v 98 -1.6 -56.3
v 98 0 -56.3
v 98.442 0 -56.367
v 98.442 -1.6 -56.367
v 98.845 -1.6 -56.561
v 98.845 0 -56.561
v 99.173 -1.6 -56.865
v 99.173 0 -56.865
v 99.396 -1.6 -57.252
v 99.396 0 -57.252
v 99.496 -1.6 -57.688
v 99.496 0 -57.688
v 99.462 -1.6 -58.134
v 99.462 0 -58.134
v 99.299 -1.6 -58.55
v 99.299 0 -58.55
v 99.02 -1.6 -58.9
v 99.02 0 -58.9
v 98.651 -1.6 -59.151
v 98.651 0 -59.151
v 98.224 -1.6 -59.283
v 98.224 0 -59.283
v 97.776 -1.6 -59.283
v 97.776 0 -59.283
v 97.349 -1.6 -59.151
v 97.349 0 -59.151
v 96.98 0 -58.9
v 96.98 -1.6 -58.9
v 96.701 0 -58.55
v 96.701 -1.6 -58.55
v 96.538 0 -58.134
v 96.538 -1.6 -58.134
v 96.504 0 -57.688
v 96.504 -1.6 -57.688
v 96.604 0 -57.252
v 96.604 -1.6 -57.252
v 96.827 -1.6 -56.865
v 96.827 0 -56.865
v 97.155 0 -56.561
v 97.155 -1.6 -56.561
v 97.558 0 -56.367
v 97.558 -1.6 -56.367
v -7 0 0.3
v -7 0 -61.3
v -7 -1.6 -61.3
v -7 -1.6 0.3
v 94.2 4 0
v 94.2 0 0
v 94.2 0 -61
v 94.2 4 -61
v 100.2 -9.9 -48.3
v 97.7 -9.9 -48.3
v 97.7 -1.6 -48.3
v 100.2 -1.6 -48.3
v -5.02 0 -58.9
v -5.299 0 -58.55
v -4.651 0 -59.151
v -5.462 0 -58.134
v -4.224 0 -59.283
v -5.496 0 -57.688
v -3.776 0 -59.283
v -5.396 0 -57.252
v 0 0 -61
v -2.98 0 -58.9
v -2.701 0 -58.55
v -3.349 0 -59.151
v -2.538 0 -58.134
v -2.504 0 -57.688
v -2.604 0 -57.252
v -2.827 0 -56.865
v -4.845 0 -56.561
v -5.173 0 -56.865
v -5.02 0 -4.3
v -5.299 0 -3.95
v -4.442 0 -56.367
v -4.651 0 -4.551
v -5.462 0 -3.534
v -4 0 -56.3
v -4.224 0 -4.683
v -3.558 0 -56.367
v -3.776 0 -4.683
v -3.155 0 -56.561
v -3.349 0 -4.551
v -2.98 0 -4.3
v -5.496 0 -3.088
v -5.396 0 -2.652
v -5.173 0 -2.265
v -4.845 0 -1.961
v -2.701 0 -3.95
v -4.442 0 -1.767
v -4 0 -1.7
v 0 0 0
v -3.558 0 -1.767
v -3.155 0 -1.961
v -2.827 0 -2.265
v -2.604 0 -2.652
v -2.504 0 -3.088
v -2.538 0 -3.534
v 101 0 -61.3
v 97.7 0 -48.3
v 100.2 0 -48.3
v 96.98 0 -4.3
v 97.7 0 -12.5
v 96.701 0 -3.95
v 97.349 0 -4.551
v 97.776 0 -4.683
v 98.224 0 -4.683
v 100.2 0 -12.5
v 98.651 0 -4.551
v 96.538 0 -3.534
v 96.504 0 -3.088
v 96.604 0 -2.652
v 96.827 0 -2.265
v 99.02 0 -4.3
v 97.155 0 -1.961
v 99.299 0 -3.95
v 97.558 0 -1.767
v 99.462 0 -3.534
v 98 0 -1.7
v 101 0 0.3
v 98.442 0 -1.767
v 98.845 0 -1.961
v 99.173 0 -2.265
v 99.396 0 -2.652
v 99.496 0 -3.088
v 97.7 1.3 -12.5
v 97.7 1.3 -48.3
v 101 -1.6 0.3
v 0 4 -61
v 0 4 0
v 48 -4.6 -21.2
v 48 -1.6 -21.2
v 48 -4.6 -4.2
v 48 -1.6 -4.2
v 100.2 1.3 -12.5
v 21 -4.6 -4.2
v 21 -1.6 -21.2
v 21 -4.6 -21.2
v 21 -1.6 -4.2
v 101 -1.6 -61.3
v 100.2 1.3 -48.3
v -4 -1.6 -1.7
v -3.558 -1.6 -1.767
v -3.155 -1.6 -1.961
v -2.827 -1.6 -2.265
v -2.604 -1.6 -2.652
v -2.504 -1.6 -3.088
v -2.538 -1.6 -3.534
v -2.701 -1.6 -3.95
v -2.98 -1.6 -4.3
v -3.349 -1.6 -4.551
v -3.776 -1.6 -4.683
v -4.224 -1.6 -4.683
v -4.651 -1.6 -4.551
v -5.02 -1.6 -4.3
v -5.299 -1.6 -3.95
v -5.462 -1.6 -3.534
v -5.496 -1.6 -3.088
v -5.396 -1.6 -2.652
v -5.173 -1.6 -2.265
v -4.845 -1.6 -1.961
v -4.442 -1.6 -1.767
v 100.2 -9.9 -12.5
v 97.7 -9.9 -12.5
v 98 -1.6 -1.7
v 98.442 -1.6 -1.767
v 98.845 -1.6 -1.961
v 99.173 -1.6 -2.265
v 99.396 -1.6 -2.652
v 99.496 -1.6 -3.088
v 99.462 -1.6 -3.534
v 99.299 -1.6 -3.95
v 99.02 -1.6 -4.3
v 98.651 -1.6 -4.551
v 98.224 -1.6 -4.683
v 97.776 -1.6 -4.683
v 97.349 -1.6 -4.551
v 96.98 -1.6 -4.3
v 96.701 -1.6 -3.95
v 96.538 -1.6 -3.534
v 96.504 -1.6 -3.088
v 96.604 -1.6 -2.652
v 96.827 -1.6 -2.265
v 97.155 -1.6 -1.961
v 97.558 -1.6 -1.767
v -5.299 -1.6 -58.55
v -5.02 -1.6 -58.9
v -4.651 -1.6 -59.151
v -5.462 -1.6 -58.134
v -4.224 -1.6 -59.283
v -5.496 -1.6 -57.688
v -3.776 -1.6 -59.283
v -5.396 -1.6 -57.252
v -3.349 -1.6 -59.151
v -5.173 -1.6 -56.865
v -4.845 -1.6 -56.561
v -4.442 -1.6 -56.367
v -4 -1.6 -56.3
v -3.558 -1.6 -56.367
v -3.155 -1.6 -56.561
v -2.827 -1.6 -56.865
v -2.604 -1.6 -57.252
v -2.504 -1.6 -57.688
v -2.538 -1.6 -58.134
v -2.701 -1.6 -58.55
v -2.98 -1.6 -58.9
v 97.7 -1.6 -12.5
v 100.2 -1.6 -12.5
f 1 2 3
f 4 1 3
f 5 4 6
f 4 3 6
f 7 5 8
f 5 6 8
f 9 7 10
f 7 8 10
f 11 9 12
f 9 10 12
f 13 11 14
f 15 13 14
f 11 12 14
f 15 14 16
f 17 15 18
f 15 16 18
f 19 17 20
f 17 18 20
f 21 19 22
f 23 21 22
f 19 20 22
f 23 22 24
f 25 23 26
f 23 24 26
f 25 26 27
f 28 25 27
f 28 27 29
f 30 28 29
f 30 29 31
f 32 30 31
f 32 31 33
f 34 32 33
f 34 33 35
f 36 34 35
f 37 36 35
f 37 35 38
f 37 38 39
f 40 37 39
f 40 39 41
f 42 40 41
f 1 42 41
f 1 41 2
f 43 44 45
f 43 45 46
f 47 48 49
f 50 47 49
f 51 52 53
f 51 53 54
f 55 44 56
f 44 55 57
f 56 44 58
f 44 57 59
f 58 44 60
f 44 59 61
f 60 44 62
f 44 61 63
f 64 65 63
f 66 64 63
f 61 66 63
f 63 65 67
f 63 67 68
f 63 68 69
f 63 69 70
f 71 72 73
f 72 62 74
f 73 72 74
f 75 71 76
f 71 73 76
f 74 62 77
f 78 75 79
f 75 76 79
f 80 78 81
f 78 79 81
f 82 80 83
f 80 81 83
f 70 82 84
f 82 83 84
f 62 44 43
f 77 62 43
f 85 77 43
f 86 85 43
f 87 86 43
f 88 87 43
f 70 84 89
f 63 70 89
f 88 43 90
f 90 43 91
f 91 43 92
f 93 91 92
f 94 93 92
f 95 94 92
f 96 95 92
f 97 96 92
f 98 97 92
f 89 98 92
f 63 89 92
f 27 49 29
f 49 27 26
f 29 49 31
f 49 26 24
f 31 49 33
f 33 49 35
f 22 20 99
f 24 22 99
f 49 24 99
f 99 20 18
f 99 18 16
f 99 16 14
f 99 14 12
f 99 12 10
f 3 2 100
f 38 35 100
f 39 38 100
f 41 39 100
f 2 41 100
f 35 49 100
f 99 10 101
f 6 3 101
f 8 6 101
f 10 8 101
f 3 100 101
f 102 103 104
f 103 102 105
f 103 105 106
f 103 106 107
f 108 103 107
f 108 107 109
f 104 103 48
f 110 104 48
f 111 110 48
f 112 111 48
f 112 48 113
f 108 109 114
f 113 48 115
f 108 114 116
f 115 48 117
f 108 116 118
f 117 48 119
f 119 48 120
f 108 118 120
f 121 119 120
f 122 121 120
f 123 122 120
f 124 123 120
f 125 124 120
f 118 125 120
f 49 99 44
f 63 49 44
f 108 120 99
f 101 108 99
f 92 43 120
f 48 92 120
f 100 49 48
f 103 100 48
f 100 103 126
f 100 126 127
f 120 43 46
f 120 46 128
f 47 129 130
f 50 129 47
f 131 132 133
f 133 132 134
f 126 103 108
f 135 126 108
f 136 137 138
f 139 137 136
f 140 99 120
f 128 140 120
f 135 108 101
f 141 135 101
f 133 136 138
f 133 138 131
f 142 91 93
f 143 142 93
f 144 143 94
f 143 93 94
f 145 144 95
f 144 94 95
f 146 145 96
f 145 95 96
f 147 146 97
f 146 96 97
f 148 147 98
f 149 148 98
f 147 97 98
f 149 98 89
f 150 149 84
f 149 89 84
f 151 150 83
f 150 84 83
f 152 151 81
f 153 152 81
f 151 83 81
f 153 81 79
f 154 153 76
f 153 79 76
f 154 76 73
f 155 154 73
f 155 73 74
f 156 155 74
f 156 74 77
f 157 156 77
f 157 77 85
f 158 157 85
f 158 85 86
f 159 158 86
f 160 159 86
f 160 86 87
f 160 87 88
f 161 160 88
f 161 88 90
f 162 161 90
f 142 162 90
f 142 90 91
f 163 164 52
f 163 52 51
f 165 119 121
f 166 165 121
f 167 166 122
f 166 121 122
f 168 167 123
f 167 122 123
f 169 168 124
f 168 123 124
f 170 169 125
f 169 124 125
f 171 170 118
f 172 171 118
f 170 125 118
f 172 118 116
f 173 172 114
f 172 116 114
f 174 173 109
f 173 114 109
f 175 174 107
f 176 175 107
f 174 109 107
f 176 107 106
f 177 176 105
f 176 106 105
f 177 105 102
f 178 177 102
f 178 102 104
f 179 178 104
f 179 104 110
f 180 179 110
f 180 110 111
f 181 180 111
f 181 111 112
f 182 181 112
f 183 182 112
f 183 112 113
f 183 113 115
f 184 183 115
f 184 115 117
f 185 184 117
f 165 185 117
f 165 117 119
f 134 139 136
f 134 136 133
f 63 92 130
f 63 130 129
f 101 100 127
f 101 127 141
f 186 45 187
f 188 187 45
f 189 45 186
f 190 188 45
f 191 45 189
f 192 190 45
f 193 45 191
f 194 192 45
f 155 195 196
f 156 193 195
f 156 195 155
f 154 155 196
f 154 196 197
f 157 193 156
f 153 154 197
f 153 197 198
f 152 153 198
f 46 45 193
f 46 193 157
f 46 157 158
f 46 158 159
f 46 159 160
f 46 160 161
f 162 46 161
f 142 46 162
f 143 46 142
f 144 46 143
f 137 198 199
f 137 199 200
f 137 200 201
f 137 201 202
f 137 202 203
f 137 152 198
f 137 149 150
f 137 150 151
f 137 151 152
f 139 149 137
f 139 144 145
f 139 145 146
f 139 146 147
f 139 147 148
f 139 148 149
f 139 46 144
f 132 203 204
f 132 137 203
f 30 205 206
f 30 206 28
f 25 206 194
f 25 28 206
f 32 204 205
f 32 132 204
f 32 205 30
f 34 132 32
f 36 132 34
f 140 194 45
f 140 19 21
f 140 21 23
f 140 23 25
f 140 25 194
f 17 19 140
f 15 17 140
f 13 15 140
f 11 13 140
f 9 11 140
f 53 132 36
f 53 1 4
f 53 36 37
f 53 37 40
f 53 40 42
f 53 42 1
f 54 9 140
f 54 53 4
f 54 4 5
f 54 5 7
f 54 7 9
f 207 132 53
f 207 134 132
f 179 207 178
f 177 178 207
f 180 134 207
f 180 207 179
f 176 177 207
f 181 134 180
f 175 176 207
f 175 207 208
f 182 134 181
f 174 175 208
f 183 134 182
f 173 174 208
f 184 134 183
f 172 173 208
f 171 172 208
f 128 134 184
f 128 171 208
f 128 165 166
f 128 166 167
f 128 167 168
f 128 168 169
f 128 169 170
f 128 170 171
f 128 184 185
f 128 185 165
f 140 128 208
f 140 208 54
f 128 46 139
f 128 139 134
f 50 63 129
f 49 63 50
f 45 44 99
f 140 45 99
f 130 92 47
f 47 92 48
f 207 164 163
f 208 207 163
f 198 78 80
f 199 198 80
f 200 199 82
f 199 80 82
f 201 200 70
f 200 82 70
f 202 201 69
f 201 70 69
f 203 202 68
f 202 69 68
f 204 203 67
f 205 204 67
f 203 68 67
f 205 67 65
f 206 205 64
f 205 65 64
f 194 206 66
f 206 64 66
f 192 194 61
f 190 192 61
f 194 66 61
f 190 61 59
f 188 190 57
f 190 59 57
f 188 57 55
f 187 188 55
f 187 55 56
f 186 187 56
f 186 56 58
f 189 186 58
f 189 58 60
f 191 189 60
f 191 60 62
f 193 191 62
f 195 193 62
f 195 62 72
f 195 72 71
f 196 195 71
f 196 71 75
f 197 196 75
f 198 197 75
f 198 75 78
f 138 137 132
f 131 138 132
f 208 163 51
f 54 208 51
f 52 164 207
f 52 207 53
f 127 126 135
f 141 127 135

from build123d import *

# Parameters (mm, degrees)
SCHIZZO1_W                        = 94.2
SCHIZZO1_H                        = 61
ESTRUSIONE_ESTRUSIONE1_DEPTH      = 4
SCHIZZO2_W                        = 108
SCHIZZO2_H                        = 61.6
ESTRUSIONE_ESTRUSIONE2_DEPTH      = 1.6
ESTRUSIONE_ESTRUSIONE3_DEPTH      = 1.3
ESTRUSIONE_ESTRUSIONE3_DEPTH_BACK = 9.9
SCHIZZO4_W                        = 2.5
SCHIZZO4_H                        = 35.8
SCHIZZO6_R                        = 1.5
TAGLIO_ESTRUSIONE1_DEPTH          = 2
SCHIZZO7_W                        = 27
SCHIZZO7_H                        = 17
ESTRUSIONE_ESTRUSIONE4_DEPTH      = 3


with BuildPart() as part:
    # Schizzo1 → Estrusione-Estrusione1 (new body)
    with BuildSketch(Plane(origin=(0, 0, 0), x_dir=(1, 0, 0), z_dir=(0, 1, 0))):
        with Locations((47.1, 30.5)):
            Rectangle(SCHIZZO1_W, SCHIZZO1_H)
    extrude(amount=ESTRUSIONE_ESTRUSIONE1_DEPTH)

    # Schizzo2 → Estrusione-Estrusione2 (add)
    with BuildSketch(Plane.XZ):
        with Locations((47, -30.5)):
            Rectangle(SCHIZZO2_W, SCHIZZO2_H)
    extrude(amount=ESTRUSIONE_ESTRUSIONE2_DEPTH)

    # Schizzo4 → Estrusione-Estrusione3 (add, two sides: drawn at the far end of the back side and taken through both)
    with BuildSketch(Plane(origin=(0, 0, 0), x_dir=(1, 0, 0), z_dir=(0, 1, 0)).offset(-ESTRUSIONE_ESTRUSIONE3_DEPTH_BACK)):
        with Locations((98.95, 30.4)):
            Rectangle(SCHIZZO4_W, SCHIZZO4_H)
    extrude(amount=ESTRUSIONE_ESTRUSIONE3_DEPTH + ESTRUSIONE_ESTRUSIONE3_DEPTH_BACK)

    # Schizzo6 → Taglio-Estrusione1 (cut)
    with BuildSketch(Plane(origin=(0, 0, 0), x_dir=(1, 0, 0), z_dir=(0, 1, 0))):
        with Locations(Location((-4, 57.8, 0), (0, 0, 270))):
            Circle(SCHIZZO6_R)
        with Locations(Location((-4, 3.2, 0), (0, 0, 270))):
            Circle(SCHIZZO6_R)
        with Locations(Location((98, 57.8, 0), (0, 0, 270))):
            Circle(SCHIZZO6_R)
        with Locations(Location((98, 3.2, 0), (0, 0, 270))):
            Circle(SCHIZZO6_R)
    extrude(amount=-TAGLIO_ESTRUSIONE1_DEPTH, mode=Mode.SUBTRACT)

    # Schizzo7 → Estrusione-Estrusione4 (add)
    with BuildSketch(Plane.XZ.offset(1.6)):
        with Locations((34.5, -12.7)):
            Rectangle(SCHIZZO7_W, SCHIZZO7_H)
    extrude(amount=ESTRUSIONE_ESTRUSIONE4_DEPTH)


solid = part.part
